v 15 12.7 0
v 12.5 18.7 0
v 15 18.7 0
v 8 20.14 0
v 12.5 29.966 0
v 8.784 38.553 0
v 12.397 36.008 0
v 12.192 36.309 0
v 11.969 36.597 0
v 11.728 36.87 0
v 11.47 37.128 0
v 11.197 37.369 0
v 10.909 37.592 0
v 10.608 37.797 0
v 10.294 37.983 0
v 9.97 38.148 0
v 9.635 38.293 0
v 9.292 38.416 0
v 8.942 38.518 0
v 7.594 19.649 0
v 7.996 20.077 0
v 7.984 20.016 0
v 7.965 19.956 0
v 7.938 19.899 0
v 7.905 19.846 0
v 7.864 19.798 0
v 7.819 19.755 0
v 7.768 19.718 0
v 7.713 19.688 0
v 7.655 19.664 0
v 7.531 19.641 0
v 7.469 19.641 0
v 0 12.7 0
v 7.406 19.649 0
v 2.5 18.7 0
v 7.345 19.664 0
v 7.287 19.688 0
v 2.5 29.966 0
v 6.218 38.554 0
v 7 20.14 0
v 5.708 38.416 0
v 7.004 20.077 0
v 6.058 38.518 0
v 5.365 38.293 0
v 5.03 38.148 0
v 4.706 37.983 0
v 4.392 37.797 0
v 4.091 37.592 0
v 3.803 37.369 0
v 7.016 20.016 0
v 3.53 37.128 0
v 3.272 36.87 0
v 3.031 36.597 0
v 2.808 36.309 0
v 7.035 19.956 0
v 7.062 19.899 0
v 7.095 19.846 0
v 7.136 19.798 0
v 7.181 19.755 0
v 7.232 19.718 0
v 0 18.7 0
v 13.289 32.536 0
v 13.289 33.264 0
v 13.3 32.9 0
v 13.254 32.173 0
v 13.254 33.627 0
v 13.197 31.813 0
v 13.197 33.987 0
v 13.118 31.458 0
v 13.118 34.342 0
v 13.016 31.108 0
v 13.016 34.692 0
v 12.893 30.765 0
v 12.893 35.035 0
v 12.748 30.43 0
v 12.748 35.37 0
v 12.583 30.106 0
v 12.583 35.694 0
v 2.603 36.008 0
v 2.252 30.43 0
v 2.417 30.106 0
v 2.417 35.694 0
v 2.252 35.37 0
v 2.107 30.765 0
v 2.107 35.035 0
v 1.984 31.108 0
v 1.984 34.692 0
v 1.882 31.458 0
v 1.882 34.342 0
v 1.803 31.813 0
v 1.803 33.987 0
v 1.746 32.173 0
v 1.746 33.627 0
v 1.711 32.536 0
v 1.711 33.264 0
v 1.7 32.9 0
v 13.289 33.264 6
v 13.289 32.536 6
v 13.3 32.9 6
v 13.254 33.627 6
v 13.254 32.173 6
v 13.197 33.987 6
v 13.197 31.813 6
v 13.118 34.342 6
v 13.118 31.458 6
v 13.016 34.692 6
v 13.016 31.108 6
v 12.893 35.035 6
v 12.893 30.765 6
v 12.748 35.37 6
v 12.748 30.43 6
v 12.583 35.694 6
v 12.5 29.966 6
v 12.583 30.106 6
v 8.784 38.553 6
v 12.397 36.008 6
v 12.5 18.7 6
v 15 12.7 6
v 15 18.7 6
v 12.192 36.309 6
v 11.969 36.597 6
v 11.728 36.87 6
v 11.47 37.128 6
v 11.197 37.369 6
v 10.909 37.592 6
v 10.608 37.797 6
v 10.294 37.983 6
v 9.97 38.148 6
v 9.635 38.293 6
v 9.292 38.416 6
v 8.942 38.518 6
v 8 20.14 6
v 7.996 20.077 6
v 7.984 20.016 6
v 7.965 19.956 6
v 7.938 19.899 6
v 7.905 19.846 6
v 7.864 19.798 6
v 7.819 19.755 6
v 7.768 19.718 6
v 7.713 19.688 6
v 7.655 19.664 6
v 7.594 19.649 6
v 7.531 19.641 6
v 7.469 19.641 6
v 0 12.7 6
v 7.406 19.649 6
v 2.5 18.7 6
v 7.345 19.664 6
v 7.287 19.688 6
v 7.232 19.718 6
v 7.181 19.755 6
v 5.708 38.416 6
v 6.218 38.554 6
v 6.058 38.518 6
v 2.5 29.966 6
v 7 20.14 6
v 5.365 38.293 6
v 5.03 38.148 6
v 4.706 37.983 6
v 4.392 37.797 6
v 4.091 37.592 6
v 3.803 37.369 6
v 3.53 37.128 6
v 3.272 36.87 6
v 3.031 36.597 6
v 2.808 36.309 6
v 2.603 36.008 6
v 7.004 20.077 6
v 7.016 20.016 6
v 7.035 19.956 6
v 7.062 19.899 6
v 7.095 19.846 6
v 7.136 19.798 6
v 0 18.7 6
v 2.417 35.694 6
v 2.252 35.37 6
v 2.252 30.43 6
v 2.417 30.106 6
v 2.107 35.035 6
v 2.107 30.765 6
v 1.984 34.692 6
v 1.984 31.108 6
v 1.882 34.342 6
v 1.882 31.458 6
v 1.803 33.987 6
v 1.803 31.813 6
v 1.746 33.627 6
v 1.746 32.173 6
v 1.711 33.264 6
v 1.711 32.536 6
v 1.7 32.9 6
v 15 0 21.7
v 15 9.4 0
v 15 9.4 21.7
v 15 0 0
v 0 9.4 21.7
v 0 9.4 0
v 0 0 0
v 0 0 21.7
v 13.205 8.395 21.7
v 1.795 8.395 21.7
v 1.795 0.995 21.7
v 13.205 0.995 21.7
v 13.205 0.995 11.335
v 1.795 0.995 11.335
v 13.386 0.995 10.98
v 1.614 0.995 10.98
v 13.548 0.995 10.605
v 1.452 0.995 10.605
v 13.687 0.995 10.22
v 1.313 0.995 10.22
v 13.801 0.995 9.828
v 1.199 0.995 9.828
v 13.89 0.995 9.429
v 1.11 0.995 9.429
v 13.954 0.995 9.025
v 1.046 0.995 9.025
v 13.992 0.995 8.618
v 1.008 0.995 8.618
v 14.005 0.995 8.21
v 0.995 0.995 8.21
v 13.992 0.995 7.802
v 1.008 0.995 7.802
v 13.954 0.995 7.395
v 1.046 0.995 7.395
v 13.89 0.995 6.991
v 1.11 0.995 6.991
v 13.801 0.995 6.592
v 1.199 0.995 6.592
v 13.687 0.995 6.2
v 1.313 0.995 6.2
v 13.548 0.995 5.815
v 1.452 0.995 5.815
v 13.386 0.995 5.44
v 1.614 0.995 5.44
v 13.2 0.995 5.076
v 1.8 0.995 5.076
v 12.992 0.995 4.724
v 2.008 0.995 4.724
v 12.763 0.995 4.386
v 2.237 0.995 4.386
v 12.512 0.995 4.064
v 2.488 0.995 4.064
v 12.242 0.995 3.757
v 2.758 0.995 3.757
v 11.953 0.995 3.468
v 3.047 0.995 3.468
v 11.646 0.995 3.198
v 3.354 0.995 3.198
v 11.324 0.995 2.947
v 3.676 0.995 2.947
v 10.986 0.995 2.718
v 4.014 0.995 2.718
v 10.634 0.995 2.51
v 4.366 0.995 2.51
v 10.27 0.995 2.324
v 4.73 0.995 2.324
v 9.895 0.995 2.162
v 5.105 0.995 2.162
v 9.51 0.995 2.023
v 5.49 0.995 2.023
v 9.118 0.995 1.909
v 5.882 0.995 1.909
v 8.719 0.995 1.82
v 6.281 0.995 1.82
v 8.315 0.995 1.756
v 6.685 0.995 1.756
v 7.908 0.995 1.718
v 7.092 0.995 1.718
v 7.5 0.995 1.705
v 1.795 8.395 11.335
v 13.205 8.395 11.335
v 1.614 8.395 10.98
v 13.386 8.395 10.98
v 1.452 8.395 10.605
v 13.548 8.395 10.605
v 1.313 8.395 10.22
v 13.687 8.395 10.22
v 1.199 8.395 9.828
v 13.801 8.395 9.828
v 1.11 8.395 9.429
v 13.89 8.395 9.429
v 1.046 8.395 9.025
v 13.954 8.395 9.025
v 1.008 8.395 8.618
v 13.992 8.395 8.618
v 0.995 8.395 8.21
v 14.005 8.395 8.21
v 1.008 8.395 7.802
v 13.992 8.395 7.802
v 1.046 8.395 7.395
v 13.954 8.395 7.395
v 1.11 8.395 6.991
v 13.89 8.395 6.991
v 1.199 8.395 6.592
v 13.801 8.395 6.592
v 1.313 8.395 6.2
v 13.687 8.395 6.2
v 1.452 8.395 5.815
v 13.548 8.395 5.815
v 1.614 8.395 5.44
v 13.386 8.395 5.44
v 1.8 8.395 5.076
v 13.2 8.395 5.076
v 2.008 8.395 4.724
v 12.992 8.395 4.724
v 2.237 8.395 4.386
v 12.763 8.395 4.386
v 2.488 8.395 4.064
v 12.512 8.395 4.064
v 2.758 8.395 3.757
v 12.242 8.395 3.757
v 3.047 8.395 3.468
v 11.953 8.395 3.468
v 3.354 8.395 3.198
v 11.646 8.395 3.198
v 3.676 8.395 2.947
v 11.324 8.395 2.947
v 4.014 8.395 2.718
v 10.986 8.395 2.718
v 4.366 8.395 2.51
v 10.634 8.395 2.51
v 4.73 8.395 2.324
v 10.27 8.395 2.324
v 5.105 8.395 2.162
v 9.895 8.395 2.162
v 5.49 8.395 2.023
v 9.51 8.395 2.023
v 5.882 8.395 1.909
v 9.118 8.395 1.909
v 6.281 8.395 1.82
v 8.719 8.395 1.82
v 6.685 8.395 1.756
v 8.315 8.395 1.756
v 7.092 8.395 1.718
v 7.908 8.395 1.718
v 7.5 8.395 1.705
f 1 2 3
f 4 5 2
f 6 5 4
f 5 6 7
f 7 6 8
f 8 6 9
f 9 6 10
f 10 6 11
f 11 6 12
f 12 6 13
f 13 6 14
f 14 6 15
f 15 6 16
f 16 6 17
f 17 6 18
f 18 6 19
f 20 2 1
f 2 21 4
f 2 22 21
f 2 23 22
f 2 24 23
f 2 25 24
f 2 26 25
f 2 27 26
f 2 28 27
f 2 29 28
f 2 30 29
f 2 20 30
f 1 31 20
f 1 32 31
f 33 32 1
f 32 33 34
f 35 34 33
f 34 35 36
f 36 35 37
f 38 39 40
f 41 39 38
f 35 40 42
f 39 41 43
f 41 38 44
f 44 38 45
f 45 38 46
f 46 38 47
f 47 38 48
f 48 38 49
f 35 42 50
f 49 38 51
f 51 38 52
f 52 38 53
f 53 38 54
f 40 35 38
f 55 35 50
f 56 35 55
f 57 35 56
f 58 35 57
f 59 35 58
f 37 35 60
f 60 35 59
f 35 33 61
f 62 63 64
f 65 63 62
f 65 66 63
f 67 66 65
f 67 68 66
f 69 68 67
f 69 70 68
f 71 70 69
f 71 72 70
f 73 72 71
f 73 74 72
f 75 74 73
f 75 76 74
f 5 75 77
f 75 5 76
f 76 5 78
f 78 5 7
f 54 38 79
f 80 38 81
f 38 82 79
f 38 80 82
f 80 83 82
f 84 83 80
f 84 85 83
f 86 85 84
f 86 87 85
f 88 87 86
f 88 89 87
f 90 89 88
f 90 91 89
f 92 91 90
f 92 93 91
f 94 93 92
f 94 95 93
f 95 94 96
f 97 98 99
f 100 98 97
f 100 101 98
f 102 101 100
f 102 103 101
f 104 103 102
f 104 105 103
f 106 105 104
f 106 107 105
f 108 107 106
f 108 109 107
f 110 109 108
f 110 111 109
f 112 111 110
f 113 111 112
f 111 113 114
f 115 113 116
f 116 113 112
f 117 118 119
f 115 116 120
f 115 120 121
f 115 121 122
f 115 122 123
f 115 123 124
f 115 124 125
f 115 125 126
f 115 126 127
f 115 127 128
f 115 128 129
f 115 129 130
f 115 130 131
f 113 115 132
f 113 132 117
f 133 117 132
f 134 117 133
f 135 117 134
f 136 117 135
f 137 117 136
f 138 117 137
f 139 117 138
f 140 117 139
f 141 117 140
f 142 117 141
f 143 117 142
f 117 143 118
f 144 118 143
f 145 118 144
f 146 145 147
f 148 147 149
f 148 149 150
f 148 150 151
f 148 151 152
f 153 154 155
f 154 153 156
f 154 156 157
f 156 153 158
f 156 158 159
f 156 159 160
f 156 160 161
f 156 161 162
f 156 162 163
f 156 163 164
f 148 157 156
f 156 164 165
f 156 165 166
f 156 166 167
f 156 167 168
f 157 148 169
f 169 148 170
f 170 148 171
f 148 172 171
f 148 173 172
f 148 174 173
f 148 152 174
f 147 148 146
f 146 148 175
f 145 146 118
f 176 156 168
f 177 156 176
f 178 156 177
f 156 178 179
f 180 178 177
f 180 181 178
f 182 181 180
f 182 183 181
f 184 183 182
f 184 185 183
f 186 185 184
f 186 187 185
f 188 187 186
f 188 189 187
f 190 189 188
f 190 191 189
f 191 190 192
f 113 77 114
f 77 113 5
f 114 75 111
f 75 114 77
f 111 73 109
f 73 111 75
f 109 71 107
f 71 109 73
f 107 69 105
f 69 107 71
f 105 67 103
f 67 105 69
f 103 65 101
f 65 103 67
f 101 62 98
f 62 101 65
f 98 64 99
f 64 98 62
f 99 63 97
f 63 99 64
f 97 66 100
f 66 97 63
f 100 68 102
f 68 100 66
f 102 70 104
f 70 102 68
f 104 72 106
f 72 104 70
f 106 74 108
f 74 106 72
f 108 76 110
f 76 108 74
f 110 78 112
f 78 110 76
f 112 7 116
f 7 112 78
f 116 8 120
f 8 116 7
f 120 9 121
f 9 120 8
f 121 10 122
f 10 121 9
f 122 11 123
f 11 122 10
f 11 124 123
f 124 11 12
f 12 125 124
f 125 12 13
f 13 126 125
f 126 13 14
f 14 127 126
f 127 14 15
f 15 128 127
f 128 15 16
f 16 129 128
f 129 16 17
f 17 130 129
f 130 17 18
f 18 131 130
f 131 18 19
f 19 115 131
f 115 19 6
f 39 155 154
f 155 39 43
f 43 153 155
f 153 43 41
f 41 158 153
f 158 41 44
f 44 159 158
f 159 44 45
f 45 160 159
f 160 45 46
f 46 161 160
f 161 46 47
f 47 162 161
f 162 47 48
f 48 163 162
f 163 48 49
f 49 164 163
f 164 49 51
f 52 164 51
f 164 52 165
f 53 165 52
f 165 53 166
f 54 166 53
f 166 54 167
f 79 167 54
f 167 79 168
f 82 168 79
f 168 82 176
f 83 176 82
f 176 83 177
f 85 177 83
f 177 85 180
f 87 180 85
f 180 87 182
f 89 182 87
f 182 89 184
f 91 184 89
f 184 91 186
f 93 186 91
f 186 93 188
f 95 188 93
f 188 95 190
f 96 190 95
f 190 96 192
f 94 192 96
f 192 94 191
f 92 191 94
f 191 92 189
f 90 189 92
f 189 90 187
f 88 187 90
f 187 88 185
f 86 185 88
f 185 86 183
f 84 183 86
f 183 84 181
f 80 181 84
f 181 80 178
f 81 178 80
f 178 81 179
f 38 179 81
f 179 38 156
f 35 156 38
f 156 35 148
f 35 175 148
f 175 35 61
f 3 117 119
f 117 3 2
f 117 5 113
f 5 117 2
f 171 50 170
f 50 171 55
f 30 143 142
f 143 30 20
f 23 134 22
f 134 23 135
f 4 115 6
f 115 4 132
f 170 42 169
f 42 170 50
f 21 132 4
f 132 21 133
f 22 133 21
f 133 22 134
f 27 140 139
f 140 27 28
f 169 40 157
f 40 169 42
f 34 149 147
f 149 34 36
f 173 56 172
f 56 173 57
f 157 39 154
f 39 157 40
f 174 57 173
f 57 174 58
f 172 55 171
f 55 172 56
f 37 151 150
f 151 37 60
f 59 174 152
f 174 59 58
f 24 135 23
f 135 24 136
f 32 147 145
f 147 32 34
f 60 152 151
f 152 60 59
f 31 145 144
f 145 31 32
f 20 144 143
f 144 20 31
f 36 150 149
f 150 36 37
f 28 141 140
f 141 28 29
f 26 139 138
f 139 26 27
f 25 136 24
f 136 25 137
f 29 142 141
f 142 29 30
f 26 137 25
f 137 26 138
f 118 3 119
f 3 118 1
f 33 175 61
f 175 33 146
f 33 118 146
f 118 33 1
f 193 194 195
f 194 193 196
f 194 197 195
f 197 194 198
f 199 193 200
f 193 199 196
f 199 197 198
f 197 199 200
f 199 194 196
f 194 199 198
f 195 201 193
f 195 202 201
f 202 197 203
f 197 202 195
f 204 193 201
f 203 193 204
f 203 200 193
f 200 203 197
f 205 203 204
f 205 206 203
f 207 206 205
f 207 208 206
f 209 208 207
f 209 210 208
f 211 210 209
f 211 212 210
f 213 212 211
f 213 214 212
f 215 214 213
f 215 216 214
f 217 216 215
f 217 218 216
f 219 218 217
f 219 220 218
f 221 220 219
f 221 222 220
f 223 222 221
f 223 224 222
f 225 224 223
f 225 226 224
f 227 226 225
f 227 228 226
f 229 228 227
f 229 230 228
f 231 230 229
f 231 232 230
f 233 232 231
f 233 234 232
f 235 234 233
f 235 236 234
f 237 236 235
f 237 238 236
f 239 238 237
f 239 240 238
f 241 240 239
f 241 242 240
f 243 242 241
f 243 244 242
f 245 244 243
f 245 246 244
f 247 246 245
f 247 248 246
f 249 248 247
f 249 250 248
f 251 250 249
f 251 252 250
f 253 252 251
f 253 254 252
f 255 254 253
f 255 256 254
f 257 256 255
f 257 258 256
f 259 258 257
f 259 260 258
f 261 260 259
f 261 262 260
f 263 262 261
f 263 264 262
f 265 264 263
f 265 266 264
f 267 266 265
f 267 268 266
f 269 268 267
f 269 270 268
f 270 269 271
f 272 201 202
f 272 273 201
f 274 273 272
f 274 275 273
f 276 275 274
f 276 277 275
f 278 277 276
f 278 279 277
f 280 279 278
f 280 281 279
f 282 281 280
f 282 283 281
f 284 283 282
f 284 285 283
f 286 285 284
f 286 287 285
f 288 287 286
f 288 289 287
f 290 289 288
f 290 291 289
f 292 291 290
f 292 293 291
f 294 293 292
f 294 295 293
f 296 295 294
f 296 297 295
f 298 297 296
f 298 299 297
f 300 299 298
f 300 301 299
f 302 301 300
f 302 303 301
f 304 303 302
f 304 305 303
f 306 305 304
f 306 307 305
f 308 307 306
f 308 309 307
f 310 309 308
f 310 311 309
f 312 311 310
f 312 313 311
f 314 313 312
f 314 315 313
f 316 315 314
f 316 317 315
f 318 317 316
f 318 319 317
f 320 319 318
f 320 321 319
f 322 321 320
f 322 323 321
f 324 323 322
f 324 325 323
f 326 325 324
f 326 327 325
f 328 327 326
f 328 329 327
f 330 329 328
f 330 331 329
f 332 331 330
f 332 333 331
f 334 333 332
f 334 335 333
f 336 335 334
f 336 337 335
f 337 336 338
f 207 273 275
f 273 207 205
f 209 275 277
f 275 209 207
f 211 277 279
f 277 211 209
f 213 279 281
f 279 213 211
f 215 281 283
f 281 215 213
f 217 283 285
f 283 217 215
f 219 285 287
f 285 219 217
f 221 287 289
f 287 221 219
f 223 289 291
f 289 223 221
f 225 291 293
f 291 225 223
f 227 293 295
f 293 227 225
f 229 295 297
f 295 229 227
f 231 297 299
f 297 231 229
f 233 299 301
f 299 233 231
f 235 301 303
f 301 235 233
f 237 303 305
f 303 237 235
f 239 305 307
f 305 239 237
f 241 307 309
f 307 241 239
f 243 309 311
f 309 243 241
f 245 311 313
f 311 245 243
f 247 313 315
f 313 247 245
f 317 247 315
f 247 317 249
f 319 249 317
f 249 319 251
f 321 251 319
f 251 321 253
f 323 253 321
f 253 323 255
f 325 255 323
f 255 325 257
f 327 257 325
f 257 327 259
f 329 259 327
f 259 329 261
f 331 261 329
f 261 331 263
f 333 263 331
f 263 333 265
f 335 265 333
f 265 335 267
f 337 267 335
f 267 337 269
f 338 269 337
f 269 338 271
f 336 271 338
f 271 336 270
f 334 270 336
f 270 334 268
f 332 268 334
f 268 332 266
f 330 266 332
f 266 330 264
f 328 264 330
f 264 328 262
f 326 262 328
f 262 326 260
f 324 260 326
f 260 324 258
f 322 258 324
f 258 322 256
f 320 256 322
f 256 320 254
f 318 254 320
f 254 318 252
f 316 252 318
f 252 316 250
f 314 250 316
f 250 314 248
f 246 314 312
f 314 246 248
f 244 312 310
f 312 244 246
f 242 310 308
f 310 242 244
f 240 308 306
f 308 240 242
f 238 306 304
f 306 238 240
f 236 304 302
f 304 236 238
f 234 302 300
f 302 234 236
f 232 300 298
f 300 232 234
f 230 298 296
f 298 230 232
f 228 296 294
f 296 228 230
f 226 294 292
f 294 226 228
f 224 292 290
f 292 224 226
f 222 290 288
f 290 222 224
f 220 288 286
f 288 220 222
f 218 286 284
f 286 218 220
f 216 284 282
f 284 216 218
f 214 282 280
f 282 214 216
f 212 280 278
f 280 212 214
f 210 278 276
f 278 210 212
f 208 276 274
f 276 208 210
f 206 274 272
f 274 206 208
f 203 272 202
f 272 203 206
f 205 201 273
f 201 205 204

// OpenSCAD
// parametrized pin and block connectors
// v0.0.1 2016oct10, ls  initial version
// v0.0.2 2016oct10, ls  changing slot against wedge should increase stability
// v0.0.3 2016oct11, ls  wall parameter refers to real wall strength now. Neglected to 
//                       consider slack in earlier versions.
// v0.0.4 2016oct11, ls  made object height a seperate configuration item. Changed demo placement.

// ------ demonstration and test ------
//  remove for library inclusion

// of tongues plus bulge, but without optional "handle"
length = 20;						// [10:100]
// measured at tongues without bulge
width = 10;						// [4:24]
// or "thickness"
height = 6;						// [2:0.1:20]
// increases sizes of block where pin parts fit in
slack = 0.7;						// [0.2:0.1:2]
// size of block walls at flat sides of pin. also, remaining size at seat of bulge
wall = 1;						// [0.2:0.1:8]
// determines how much bulge protrudes over width
bulge = 0.8;						// [0.2:0.1:4]
// changes slot width and recess to modulate forces for connecting and holding
tension = 3.2;    					// [3:0.1:4]

spacing = 0+5;						// for item positioning 
over  = wall+slack+bulge;
outer = over+width+over;

translate([0, height+wall+slack+spacing, 0])  {
   cube([outer, height, height]);			// optional "handle"
   translate([over, height, 0])
   pin  (length, width, height, bulge, tension);
}

block(length, width, height, bulge, wall, slack);

// ------------------------------------

little = 0+0.01;					// improve preview quality

module wedge(length, width, height)  {
   linear_extrude(height)  {
      hull()  {
         circle(0.5, $fn=50);
         for (i=[-2,2])
         translate([width/i, length])
         circle(little);
      }
   }
}

module pin_and_block(len, width, height, bulge, slack)  {
   radius = min(width/2+bulge+slack, length/2);
   echo(radius);
   linear_extrude(height+2*slack) {  
      union()  {
         square([width+slack*2, len-radius]);
         translate([width/2+slack, len-radius])
         circle(radius, $fn=100);
      }
   }
}

module pin(len, width, height, bulge, tension) {
   radius = width/2+bulge;
   difference()  {
      pin_and_block(len, width, height, bulge, 0);
      translate([width/2, len-tension*radius, -little/2])
      wedge(tension*radius, tension*bulge, height+little);
   }
}


module block(len, width, height, bulge, wall, slack) {
   w = wall+slack;
   l = len+w;
   translate([0, 0, l])
   rotate([270, 0, 0])
   difference()  {
      cube([width+2*(bulge+w), l, height+2*w]);
      translate([bulge+wall-little/2, -little/2, wall-little/2])
      pin_and_block(len, width+little, height, bulge, slack);
   }
}
